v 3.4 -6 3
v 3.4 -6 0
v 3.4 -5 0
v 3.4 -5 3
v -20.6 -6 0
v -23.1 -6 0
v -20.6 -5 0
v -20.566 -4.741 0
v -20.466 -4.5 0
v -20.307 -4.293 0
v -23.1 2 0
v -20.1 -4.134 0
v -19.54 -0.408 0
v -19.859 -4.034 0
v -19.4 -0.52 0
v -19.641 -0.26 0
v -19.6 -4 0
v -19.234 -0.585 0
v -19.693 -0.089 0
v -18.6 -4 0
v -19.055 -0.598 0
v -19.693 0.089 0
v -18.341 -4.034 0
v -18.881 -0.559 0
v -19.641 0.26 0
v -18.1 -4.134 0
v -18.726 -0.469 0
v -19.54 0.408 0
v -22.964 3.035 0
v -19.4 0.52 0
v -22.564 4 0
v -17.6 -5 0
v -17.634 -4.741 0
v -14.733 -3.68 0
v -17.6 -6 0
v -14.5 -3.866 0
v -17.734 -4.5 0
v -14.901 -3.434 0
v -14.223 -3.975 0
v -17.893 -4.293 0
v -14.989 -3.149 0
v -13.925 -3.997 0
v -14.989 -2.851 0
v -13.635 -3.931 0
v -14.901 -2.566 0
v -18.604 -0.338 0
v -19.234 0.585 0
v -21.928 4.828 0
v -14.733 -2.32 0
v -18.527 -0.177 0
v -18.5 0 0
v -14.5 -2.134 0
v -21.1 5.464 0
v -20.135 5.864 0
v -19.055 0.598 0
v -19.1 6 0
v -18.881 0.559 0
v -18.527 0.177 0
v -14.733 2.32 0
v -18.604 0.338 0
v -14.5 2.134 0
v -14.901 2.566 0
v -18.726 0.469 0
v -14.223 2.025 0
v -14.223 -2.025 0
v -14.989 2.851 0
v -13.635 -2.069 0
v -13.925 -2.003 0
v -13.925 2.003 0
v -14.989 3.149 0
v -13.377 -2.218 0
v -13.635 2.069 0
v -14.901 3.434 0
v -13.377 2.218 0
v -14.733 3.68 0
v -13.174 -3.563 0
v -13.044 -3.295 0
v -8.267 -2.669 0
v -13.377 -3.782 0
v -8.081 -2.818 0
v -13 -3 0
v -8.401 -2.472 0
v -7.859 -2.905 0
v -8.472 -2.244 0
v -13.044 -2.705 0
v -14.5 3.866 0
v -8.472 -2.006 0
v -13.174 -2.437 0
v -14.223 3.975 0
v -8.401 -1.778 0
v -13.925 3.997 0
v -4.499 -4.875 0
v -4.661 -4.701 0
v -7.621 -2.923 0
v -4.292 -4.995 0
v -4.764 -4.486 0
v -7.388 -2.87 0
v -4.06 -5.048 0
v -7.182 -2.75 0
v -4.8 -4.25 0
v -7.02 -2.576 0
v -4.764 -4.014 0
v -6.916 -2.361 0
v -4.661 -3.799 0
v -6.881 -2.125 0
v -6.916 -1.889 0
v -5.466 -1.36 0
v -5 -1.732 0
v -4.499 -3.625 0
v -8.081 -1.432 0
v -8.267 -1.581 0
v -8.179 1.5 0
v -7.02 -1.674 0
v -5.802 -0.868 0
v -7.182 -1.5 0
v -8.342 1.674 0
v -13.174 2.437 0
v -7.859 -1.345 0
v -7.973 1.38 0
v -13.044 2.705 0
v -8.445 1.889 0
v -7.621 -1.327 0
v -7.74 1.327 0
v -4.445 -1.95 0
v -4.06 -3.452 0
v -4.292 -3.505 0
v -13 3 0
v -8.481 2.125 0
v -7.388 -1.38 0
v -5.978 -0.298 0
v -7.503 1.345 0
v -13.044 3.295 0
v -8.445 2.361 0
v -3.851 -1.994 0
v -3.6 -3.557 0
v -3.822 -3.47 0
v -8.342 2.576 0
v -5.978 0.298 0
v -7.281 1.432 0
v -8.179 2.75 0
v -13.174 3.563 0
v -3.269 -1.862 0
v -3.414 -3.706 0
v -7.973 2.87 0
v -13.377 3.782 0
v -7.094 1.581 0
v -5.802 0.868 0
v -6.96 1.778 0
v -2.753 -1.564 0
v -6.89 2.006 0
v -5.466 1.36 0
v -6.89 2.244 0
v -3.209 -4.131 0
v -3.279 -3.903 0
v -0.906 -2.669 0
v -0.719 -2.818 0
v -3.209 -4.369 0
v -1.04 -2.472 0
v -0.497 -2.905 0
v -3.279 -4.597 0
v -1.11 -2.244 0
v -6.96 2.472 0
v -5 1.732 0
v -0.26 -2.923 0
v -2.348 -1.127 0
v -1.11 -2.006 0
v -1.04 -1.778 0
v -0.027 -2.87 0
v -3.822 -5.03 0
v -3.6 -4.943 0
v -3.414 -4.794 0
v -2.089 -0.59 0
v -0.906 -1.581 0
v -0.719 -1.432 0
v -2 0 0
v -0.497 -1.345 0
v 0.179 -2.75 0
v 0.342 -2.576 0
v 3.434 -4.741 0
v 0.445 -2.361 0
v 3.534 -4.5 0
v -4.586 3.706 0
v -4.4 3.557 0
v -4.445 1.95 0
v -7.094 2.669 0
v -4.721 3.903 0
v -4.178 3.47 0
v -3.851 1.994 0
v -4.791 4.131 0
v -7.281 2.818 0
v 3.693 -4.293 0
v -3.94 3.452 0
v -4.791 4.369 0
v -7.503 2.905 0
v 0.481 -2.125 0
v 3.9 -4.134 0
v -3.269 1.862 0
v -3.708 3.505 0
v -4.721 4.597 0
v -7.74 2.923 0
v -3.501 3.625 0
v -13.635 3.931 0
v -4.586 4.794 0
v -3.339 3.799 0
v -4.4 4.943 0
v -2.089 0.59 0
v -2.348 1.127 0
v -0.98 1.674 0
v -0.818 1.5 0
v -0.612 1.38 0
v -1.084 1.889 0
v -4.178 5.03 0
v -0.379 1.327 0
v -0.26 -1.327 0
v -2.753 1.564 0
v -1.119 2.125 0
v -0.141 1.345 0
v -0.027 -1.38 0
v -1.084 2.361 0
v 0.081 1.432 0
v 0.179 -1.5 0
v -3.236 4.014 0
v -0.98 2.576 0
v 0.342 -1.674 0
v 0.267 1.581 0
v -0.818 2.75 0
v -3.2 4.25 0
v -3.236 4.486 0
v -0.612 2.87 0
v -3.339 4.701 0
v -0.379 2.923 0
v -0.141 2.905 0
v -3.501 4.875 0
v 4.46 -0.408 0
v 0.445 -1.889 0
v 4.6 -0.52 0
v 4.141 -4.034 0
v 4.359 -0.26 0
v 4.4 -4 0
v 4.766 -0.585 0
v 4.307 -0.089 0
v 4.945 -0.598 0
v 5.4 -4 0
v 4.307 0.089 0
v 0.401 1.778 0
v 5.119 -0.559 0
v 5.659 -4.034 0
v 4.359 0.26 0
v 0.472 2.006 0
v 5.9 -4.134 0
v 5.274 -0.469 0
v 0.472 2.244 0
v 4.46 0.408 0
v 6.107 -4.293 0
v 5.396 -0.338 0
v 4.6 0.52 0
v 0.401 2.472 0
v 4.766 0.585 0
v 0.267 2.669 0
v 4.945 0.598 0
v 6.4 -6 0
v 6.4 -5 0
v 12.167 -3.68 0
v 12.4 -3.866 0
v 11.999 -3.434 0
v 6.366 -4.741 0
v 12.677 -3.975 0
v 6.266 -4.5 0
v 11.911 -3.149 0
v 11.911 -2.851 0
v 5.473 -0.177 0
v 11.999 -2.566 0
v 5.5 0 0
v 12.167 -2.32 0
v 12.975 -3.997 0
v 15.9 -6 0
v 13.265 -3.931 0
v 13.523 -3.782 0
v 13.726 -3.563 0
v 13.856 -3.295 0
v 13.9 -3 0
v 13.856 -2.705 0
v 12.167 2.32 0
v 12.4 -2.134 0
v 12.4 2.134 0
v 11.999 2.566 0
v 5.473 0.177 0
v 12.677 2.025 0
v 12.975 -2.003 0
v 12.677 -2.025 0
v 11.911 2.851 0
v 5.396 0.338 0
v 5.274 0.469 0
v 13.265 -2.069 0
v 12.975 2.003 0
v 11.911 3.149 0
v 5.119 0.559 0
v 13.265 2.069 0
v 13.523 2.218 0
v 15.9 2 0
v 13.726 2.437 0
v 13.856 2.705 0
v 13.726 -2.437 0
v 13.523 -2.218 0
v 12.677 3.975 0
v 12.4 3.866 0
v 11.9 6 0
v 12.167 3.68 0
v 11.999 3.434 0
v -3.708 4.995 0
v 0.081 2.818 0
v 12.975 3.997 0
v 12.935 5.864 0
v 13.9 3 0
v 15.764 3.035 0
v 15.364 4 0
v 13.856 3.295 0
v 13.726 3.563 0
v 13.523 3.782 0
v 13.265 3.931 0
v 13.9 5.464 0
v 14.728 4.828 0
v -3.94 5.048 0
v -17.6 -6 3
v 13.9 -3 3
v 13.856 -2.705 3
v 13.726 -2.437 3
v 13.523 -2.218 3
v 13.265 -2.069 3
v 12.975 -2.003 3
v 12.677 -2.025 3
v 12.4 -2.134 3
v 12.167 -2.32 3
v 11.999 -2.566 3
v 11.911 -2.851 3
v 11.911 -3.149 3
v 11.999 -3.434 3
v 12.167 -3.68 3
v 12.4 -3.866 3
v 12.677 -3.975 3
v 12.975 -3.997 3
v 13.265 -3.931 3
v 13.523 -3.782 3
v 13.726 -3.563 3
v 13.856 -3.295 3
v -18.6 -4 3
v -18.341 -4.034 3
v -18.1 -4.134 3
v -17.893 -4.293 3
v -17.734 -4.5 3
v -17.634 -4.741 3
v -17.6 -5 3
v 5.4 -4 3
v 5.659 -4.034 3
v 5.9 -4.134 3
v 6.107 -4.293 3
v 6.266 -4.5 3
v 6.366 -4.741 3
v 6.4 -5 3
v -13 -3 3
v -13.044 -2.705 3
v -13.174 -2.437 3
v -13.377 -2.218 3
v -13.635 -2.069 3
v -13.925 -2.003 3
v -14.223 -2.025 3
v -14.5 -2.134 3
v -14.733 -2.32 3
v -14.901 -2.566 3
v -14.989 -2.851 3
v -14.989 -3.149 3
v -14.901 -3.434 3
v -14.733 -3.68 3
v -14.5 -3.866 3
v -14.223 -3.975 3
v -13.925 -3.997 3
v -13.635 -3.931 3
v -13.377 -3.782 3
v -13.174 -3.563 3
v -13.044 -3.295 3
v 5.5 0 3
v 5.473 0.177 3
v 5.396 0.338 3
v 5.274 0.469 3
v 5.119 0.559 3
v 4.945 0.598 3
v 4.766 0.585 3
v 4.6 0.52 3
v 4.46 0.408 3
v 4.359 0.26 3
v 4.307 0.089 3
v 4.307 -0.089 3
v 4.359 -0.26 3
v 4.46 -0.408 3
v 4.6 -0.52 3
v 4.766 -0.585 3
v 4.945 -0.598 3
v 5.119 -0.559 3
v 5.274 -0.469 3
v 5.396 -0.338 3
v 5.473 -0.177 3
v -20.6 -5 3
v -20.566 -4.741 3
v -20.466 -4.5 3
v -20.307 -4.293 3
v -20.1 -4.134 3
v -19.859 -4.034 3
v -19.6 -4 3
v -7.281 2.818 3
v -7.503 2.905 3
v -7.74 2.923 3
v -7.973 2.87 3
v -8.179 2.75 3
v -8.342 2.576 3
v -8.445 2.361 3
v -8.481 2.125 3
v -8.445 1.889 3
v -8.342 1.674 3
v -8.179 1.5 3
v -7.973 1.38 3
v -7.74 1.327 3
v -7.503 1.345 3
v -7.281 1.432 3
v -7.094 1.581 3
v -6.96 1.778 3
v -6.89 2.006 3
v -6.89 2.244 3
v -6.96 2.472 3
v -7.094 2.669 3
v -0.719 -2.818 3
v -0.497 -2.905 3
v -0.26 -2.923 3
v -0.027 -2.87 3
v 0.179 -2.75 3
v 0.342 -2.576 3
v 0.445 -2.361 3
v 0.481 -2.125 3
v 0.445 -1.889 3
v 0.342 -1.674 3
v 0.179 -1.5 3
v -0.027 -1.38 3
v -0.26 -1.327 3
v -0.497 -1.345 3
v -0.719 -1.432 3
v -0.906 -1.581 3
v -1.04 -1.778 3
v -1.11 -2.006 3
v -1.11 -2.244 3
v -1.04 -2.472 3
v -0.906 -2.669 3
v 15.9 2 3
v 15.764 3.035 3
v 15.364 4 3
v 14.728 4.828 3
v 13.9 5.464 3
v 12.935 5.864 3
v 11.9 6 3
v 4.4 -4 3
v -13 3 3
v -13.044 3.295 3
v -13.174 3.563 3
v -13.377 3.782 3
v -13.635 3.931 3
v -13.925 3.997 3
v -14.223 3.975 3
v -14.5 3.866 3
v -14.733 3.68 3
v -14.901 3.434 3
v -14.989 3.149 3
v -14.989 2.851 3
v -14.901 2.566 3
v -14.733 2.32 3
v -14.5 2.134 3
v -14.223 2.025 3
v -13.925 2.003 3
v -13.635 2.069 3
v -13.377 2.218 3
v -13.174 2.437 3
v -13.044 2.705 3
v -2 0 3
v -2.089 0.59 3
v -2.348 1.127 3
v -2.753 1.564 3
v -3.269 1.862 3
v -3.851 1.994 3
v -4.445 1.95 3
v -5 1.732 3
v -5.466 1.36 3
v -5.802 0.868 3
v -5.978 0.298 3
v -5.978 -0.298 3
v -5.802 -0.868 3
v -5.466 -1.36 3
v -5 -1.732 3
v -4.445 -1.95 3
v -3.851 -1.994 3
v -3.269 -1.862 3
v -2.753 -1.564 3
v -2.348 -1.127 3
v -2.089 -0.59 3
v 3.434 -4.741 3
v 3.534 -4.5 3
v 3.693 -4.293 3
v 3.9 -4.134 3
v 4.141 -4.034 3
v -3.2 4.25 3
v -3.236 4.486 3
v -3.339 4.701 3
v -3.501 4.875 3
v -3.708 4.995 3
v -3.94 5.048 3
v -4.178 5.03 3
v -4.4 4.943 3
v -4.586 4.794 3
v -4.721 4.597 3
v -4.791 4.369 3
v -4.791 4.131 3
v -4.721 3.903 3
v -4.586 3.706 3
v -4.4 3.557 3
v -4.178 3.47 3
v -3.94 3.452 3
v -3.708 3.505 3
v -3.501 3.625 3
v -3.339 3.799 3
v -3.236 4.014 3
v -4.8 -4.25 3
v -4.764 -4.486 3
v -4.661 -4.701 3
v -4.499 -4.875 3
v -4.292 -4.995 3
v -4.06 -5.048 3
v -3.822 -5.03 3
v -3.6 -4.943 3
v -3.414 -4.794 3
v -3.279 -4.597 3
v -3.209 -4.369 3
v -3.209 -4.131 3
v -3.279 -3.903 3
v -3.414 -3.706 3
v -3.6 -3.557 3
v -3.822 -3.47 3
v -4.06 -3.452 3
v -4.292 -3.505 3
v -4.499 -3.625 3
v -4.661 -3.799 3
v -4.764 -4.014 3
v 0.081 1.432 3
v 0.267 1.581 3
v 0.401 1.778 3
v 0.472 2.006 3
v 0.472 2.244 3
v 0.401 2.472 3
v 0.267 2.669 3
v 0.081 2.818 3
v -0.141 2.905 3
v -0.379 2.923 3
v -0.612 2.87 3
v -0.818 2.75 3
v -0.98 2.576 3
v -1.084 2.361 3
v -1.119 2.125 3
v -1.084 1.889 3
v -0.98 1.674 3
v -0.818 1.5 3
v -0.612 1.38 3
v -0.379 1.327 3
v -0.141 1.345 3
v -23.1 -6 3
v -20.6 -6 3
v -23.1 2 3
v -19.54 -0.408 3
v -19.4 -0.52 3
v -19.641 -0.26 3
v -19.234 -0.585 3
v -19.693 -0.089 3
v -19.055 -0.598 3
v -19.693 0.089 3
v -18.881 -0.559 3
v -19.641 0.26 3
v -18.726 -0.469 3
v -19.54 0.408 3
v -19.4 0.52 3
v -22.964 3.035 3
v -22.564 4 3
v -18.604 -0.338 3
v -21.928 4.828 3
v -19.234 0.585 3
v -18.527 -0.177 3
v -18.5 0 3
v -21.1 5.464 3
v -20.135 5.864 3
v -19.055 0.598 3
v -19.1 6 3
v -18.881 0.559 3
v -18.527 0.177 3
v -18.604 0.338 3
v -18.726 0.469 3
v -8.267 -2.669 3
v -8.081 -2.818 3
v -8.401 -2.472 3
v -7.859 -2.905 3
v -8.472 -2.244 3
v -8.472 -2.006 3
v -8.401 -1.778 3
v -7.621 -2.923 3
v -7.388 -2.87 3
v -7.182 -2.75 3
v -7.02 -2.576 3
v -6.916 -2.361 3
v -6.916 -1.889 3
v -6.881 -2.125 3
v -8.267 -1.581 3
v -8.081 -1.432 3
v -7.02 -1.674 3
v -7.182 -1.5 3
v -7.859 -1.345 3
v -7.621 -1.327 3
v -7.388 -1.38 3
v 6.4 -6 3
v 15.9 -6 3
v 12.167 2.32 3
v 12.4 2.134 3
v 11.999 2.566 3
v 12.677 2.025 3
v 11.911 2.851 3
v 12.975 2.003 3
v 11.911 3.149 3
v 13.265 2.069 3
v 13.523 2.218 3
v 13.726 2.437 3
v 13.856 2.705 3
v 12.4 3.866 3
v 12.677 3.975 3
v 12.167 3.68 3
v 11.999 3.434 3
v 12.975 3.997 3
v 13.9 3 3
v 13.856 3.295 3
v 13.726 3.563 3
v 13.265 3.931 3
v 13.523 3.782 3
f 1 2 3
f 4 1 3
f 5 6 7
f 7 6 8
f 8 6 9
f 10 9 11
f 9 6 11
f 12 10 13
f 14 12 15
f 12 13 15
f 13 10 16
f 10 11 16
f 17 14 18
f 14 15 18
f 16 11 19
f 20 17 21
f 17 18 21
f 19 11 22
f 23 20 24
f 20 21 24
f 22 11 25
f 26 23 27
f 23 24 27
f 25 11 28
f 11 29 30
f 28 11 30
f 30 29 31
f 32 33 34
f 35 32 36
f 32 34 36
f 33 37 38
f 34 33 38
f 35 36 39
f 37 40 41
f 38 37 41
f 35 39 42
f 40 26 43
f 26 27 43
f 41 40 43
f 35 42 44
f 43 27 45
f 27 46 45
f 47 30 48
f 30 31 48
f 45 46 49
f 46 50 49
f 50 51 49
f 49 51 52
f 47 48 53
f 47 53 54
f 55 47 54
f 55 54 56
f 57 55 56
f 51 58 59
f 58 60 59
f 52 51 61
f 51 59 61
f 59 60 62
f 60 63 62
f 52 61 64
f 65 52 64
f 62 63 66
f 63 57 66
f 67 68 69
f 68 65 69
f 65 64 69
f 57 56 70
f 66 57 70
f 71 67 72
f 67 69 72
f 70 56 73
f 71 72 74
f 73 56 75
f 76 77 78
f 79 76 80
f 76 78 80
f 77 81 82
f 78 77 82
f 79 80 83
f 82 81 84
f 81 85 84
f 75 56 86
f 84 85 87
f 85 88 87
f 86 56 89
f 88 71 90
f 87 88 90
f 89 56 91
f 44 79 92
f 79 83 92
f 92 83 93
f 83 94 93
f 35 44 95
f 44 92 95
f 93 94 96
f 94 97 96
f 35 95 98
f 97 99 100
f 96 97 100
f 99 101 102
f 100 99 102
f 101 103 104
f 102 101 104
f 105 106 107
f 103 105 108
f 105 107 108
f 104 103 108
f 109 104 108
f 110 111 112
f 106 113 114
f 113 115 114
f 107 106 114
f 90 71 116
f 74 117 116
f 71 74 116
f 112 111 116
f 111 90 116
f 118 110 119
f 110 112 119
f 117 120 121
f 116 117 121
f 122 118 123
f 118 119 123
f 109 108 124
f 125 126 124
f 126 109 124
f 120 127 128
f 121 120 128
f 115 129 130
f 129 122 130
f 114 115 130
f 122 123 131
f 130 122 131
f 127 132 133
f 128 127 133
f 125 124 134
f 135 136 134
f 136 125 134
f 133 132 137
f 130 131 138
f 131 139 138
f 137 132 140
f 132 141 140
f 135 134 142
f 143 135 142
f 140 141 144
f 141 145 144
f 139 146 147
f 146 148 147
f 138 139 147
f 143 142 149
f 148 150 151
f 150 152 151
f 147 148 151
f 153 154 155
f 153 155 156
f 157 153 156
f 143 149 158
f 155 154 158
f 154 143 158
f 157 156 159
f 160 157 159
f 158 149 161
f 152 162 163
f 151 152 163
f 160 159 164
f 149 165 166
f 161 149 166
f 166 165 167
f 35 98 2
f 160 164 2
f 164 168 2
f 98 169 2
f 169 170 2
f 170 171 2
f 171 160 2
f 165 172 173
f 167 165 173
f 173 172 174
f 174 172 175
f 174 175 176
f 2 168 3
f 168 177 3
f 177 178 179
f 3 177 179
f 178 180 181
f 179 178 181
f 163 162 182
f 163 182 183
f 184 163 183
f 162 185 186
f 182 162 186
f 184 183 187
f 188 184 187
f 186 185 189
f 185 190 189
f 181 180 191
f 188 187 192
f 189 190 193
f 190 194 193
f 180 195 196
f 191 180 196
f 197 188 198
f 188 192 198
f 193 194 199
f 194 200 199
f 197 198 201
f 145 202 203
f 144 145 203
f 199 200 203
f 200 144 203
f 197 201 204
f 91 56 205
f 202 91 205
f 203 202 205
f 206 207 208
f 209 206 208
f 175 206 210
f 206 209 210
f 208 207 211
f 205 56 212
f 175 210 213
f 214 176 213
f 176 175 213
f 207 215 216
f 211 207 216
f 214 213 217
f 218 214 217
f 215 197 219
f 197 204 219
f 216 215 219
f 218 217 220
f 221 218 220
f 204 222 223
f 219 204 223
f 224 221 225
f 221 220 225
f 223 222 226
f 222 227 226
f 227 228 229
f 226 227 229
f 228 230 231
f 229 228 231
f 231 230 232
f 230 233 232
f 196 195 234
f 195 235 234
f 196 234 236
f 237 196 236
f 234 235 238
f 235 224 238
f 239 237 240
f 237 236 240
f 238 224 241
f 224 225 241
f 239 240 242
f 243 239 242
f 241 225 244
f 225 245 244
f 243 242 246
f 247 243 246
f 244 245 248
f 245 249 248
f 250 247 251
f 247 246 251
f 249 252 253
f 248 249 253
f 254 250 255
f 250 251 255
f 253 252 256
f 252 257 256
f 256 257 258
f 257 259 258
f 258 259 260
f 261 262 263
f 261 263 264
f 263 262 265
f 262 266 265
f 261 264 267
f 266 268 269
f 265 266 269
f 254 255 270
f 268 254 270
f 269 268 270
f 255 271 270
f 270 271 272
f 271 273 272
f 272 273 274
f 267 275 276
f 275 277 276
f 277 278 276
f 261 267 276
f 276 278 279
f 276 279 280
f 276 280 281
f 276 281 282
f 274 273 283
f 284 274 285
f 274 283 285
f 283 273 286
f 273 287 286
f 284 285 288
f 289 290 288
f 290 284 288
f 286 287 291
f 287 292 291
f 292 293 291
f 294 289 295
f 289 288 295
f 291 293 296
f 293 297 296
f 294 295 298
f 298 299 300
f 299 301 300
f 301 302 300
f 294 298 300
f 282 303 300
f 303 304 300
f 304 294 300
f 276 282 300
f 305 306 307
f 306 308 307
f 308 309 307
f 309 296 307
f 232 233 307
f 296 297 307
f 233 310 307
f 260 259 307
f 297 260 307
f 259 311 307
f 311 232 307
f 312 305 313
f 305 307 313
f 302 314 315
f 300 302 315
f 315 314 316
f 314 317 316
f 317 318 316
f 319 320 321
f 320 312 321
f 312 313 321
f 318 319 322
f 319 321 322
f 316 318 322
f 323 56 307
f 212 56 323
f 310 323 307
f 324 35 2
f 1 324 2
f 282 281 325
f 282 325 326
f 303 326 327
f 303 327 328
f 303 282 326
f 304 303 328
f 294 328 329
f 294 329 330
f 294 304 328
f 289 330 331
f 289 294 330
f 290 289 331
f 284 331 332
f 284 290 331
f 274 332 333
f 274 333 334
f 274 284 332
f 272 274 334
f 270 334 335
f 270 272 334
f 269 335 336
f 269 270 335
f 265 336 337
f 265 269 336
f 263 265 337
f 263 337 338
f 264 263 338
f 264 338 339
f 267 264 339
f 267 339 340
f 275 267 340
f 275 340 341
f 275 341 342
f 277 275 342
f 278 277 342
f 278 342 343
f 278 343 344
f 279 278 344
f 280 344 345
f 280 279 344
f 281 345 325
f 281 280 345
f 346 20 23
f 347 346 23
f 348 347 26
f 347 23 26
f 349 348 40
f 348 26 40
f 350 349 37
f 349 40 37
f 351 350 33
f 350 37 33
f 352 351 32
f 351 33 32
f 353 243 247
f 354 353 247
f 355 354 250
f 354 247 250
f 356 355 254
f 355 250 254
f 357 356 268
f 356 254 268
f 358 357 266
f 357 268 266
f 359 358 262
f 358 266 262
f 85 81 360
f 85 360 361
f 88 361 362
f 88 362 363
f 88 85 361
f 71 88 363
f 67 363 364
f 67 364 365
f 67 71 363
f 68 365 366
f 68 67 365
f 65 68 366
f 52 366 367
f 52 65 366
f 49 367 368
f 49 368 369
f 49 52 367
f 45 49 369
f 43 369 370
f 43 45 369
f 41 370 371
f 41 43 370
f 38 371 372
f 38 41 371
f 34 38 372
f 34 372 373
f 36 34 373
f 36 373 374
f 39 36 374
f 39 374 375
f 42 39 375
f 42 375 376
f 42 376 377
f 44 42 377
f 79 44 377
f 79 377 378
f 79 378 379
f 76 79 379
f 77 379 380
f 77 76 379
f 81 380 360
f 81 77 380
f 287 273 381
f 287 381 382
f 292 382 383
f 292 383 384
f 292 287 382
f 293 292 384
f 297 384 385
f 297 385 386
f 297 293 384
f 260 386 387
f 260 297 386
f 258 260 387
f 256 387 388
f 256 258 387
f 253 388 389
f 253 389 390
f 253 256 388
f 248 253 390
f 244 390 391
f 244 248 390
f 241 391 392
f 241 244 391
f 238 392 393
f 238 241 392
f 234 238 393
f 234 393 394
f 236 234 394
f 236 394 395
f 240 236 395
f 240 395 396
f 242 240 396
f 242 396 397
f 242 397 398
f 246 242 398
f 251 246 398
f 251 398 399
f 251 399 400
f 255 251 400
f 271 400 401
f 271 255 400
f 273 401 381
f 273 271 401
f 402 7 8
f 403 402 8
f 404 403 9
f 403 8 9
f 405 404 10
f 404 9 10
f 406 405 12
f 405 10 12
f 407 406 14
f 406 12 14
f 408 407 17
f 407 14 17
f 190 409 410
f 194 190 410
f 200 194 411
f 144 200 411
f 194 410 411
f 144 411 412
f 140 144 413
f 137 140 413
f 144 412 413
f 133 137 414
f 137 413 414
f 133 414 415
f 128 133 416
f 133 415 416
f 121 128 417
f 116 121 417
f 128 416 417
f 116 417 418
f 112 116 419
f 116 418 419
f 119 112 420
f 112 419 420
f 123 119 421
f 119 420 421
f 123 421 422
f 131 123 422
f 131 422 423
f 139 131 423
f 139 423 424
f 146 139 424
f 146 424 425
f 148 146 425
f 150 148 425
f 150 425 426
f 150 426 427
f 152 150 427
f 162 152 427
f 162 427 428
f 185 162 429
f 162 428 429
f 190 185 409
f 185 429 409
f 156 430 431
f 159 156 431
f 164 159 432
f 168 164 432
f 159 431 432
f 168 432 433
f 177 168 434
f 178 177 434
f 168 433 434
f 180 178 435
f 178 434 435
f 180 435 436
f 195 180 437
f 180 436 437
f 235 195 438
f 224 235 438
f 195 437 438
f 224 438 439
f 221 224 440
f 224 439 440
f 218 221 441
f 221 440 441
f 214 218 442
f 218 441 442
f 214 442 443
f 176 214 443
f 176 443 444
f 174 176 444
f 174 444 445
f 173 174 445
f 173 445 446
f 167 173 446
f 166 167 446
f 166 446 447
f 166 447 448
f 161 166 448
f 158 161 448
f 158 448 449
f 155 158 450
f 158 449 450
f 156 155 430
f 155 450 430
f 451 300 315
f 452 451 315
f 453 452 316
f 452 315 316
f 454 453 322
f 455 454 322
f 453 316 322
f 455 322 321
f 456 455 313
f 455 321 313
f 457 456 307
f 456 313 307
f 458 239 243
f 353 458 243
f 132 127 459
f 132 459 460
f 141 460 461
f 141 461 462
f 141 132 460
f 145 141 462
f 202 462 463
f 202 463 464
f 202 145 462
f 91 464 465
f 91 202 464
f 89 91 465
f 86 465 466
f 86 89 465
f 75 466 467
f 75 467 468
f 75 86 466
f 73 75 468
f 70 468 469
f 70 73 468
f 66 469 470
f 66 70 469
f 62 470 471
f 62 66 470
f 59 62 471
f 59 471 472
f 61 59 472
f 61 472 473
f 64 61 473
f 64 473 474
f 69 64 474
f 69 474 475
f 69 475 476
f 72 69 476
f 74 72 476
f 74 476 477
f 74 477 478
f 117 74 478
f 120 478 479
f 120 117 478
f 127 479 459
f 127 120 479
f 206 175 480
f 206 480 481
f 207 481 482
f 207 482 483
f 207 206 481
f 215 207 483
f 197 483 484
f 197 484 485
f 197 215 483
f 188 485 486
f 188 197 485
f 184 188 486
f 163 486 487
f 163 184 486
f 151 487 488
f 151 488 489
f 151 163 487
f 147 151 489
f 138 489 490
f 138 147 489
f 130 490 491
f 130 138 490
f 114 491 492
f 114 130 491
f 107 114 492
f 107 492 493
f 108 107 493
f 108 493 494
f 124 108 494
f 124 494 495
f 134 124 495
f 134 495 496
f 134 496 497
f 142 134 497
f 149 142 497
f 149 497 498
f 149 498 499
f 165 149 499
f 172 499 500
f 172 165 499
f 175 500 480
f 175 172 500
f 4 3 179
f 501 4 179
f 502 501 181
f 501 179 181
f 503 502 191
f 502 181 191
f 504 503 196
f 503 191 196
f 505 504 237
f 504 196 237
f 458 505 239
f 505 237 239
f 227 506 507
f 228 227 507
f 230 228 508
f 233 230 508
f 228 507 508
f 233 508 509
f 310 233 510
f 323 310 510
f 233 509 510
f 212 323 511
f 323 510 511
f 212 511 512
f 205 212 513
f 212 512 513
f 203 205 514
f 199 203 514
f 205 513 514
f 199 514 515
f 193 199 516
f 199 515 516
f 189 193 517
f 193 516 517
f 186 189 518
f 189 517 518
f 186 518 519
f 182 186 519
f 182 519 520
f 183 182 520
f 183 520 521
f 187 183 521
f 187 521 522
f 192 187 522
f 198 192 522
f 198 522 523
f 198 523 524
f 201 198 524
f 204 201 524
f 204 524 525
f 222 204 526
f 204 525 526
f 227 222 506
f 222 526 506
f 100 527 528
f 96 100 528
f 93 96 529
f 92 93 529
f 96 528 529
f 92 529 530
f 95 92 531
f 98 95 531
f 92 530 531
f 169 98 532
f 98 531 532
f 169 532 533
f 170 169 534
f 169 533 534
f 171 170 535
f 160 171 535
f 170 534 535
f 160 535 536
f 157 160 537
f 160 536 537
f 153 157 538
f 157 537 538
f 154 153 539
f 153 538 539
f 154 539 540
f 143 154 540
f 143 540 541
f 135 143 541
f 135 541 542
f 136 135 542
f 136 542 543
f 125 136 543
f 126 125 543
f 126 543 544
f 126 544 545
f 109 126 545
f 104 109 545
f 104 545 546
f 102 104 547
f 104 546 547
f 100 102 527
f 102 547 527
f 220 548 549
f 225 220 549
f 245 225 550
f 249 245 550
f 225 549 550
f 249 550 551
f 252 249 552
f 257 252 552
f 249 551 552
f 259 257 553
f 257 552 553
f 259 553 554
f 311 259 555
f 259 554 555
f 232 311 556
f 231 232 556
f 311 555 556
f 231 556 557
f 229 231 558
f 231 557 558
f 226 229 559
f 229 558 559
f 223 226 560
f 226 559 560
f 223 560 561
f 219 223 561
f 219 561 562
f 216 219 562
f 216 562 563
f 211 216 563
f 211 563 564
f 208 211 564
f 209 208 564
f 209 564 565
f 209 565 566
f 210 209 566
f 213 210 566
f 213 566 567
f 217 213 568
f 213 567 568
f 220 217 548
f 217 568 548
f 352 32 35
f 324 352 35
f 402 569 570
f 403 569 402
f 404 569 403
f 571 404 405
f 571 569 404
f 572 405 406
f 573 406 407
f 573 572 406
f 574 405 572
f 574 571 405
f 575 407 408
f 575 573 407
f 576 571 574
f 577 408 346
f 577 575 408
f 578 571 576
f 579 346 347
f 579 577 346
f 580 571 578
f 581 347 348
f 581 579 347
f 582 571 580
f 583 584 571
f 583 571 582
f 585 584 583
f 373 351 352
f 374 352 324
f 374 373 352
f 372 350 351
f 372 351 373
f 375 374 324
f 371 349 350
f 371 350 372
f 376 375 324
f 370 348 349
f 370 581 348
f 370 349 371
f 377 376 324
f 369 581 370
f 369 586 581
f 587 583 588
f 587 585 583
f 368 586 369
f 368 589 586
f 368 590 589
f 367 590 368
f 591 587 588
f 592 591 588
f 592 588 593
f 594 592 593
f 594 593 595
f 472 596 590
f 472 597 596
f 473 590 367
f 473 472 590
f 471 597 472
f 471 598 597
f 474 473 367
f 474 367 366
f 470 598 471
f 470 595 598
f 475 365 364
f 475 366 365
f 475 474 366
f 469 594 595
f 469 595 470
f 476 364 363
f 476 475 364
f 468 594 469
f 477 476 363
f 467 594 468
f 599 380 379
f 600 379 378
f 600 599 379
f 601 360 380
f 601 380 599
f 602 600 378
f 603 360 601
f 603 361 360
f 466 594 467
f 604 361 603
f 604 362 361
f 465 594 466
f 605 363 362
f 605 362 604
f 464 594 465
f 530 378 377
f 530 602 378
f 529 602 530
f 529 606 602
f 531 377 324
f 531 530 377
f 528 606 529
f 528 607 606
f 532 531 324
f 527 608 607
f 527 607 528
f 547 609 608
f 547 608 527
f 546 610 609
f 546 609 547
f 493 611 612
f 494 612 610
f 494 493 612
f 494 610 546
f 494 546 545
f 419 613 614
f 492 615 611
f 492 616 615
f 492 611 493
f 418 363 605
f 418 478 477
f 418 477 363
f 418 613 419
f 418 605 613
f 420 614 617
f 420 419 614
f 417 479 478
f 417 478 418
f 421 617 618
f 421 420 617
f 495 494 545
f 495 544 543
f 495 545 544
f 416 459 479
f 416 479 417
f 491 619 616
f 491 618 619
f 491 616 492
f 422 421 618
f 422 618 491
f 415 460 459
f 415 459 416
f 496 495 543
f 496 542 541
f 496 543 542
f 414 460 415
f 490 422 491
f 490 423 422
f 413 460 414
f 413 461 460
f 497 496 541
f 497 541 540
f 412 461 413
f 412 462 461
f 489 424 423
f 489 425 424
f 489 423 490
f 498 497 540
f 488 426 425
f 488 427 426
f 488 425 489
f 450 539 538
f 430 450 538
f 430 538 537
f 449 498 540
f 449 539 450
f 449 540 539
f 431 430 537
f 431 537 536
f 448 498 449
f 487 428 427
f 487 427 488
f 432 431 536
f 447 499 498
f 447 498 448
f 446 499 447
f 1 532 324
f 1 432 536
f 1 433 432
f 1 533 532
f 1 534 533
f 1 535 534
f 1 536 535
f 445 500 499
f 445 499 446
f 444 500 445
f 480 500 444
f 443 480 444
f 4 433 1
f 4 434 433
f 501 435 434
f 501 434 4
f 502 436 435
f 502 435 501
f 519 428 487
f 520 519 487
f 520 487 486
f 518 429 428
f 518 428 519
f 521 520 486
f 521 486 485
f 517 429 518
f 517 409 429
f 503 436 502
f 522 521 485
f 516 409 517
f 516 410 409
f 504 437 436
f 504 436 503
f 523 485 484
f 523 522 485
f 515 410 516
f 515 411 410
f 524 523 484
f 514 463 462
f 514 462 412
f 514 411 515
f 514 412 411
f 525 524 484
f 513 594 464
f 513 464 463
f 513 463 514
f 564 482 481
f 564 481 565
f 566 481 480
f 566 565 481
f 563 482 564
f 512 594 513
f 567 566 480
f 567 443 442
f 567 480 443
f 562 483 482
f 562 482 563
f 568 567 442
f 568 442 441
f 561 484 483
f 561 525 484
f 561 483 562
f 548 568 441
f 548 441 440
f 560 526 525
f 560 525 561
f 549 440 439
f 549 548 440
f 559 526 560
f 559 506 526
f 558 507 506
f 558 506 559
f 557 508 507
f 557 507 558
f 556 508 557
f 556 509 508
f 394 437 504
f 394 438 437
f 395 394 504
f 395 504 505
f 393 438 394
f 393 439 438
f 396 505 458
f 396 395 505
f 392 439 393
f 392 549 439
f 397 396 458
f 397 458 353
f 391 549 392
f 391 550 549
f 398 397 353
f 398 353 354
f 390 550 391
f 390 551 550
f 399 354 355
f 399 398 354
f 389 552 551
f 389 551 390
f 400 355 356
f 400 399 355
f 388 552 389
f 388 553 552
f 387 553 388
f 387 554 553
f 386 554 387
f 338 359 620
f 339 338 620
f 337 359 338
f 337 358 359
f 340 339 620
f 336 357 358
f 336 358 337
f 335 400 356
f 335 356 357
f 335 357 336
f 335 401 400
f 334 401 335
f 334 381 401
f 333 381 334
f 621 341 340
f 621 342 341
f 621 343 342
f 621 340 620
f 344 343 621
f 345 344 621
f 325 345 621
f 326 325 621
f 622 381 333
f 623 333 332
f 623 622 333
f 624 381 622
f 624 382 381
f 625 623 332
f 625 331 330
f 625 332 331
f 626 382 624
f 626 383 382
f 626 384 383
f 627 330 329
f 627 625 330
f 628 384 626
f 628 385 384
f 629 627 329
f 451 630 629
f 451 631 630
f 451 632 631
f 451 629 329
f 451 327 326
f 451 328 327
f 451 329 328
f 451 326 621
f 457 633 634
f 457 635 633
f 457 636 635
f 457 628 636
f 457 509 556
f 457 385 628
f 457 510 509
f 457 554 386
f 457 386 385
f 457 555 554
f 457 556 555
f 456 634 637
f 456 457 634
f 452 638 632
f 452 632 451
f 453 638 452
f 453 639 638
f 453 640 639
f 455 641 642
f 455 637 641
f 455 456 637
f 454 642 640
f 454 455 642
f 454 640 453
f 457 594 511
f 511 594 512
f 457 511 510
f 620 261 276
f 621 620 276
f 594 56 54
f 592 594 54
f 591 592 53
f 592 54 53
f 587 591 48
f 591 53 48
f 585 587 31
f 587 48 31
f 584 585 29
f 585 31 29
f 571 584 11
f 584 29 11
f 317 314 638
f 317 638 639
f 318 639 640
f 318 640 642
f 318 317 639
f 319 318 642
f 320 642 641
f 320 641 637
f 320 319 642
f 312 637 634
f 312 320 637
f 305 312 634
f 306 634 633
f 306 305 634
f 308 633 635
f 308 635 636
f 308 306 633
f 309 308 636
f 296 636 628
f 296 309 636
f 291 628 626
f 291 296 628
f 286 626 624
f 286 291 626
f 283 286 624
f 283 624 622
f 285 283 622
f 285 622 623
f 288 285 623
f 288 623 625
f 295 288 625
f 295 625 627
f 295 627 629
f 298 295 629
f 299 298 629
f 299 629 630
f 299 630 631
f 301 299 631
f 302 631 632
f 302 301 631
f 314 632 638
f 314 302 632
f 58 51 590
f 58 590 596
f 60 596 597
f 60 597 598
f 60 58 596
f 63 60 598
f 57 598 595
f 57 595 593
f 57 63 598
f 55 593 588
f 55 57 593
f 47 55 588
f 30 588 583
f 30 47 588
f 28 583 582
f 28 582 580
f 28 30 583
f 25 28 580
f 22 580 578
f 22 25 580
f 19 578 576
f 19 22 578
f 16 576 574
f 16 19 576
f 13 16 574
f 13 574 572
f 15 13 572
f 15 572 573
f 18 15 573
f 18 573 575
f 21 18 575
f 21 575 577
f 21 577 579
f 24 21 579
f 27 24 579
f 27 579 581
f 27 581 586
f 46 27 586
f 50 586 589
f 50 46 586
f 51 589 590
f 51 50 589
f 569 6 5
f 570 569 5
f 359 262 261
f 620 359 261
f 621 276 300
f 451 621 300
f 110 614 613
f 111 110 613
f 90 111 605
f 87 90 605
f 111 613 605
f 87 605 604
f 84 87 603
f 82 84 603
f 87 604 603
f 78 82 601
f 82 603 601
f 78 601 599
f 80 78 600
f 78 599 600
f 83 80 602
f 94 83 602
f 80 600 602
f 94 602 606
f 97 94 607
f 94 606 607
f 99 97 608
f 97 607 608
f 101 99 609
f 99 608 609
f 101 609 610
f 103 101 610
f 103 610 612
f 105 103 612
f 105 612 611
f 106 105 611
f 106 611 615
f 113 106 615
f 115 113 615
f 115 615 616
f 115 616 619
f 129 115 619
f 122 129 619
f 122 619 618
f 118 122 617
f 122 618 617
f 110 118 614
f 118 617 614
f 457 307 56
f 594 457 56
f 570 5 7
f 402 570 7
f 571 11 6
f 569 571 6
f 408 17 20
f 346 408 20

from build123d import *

# Parameters (mm, degrees)
SKETCH1_R           = 1
SKETCH1_R_2         = 0.6
SKETCH1_R_3         = 2
BOSS_EXTRUDE1_DEPTH = 3
SKETCH3_R           = 0.8
CUT_EXTRUDE1_DEPTH  = 3
CIRPATTERN1_COUNT   = 6


with BuildPart() as part:
    # Sketch1 → Boss-Extrude1 (new body)
    with BuildSketch(Plane.XY):
        with BuildLine():
            Line((-23.1, 2), (-23.1, -6))
            Line((-23.1, -6), (-20.6, -6))
            Line((-20.6, -6), (-20.6, -5))
            ThreePointArc((-20.6, -5), (-20.307106781, -4.292893219), (-19.6, -4))
            Line((-19.6, -4), (-18.6, -4))
            ThreePointArc((-18.6, -4), (-17.892893219, -4.292893219), (-17.6, -5))
            Line((-17.6, -5), (-17.6, -6))
            Line((-17.6, -6), (3.4, -6))
            Line((3.4, -6), (3.4, -5))
            ThreePointArc((3.4, -5), (3.692893219, -4.292893219), (4.4, -4))
            Line((4.4, -4), (5.4, -4))
            ThreePointArc((5.4, -4), (6.107106781, -4.292893219), (6.4, -5))
            Line((6.4, -5), (6.4, -6))
            Line((6.4, -6), (15.9, -6))
            Line((15.9, -6), (15.9, 2))
            ThreePointArc((15.9, 2), (14.728427125, 4.828427125), (11.9, 6))
            Line((11.9, 6), (-19.1, 6))
            ThreePointArc((-19.1, 6), (-21.928427125, 4.828427125), (-23.1, 2))
        make_face()
        with Locations((-14, -3)):
            Circle(SKETCH1_R, mode=Mode.SUBTRACT)
        with Locations((12.9, -3)):
            Circle(SKETCH1_R, mode=Mode.SUBTRACT)
        with Locations((-19.1, 0)):
            Circle(SKETCH1_R_2, mode=Mode.SUBTRACT)
        with Locations((-14, 3)):
            Circle(SKETCH1_R, mode=Mode.SUBTRACT)
        with Locations((-4, 0)):
            Circle(SKETCH1_R_3, mode=Mode.SUBTRACT)
        with Locations((4.9, 0)):
            Circle(SKETCH1_R_2, mode=Mode.SUBTRACT)
        with Locations((12.9, 3)):
            Circle(SKETCH1_R, mode=Mode.SUBTRACT)
    extrude(amount=BOSS_EXTRUDE1_DEPTH)

    # Sketch3 → Cut-Extrude1 (cut)
    with BuildSketch(Plane.XY.offset(3)):
        with Locations((-4, 4.25)):
            Circle(SKETCH3_R)
    cut_extrude1 = extrude(amount=-CUT_EXTRUDE1_DEPTH, mode=Mode.SUBTRACT)

    # CirPattern1: Cut-Extrude1 ×6 about axis
    cirpattern1_axis = Axis((-4, 0, 0), (0, 0, 1))
    for i in range(1, CIRPATTERN1_COUNT):
        add(cut_extrude1.rotate(cirpattern1_axis, i * 360 / CIRPATTERN1_COUNT), mode=Mode.SUBTRACT)


solid = part.part
